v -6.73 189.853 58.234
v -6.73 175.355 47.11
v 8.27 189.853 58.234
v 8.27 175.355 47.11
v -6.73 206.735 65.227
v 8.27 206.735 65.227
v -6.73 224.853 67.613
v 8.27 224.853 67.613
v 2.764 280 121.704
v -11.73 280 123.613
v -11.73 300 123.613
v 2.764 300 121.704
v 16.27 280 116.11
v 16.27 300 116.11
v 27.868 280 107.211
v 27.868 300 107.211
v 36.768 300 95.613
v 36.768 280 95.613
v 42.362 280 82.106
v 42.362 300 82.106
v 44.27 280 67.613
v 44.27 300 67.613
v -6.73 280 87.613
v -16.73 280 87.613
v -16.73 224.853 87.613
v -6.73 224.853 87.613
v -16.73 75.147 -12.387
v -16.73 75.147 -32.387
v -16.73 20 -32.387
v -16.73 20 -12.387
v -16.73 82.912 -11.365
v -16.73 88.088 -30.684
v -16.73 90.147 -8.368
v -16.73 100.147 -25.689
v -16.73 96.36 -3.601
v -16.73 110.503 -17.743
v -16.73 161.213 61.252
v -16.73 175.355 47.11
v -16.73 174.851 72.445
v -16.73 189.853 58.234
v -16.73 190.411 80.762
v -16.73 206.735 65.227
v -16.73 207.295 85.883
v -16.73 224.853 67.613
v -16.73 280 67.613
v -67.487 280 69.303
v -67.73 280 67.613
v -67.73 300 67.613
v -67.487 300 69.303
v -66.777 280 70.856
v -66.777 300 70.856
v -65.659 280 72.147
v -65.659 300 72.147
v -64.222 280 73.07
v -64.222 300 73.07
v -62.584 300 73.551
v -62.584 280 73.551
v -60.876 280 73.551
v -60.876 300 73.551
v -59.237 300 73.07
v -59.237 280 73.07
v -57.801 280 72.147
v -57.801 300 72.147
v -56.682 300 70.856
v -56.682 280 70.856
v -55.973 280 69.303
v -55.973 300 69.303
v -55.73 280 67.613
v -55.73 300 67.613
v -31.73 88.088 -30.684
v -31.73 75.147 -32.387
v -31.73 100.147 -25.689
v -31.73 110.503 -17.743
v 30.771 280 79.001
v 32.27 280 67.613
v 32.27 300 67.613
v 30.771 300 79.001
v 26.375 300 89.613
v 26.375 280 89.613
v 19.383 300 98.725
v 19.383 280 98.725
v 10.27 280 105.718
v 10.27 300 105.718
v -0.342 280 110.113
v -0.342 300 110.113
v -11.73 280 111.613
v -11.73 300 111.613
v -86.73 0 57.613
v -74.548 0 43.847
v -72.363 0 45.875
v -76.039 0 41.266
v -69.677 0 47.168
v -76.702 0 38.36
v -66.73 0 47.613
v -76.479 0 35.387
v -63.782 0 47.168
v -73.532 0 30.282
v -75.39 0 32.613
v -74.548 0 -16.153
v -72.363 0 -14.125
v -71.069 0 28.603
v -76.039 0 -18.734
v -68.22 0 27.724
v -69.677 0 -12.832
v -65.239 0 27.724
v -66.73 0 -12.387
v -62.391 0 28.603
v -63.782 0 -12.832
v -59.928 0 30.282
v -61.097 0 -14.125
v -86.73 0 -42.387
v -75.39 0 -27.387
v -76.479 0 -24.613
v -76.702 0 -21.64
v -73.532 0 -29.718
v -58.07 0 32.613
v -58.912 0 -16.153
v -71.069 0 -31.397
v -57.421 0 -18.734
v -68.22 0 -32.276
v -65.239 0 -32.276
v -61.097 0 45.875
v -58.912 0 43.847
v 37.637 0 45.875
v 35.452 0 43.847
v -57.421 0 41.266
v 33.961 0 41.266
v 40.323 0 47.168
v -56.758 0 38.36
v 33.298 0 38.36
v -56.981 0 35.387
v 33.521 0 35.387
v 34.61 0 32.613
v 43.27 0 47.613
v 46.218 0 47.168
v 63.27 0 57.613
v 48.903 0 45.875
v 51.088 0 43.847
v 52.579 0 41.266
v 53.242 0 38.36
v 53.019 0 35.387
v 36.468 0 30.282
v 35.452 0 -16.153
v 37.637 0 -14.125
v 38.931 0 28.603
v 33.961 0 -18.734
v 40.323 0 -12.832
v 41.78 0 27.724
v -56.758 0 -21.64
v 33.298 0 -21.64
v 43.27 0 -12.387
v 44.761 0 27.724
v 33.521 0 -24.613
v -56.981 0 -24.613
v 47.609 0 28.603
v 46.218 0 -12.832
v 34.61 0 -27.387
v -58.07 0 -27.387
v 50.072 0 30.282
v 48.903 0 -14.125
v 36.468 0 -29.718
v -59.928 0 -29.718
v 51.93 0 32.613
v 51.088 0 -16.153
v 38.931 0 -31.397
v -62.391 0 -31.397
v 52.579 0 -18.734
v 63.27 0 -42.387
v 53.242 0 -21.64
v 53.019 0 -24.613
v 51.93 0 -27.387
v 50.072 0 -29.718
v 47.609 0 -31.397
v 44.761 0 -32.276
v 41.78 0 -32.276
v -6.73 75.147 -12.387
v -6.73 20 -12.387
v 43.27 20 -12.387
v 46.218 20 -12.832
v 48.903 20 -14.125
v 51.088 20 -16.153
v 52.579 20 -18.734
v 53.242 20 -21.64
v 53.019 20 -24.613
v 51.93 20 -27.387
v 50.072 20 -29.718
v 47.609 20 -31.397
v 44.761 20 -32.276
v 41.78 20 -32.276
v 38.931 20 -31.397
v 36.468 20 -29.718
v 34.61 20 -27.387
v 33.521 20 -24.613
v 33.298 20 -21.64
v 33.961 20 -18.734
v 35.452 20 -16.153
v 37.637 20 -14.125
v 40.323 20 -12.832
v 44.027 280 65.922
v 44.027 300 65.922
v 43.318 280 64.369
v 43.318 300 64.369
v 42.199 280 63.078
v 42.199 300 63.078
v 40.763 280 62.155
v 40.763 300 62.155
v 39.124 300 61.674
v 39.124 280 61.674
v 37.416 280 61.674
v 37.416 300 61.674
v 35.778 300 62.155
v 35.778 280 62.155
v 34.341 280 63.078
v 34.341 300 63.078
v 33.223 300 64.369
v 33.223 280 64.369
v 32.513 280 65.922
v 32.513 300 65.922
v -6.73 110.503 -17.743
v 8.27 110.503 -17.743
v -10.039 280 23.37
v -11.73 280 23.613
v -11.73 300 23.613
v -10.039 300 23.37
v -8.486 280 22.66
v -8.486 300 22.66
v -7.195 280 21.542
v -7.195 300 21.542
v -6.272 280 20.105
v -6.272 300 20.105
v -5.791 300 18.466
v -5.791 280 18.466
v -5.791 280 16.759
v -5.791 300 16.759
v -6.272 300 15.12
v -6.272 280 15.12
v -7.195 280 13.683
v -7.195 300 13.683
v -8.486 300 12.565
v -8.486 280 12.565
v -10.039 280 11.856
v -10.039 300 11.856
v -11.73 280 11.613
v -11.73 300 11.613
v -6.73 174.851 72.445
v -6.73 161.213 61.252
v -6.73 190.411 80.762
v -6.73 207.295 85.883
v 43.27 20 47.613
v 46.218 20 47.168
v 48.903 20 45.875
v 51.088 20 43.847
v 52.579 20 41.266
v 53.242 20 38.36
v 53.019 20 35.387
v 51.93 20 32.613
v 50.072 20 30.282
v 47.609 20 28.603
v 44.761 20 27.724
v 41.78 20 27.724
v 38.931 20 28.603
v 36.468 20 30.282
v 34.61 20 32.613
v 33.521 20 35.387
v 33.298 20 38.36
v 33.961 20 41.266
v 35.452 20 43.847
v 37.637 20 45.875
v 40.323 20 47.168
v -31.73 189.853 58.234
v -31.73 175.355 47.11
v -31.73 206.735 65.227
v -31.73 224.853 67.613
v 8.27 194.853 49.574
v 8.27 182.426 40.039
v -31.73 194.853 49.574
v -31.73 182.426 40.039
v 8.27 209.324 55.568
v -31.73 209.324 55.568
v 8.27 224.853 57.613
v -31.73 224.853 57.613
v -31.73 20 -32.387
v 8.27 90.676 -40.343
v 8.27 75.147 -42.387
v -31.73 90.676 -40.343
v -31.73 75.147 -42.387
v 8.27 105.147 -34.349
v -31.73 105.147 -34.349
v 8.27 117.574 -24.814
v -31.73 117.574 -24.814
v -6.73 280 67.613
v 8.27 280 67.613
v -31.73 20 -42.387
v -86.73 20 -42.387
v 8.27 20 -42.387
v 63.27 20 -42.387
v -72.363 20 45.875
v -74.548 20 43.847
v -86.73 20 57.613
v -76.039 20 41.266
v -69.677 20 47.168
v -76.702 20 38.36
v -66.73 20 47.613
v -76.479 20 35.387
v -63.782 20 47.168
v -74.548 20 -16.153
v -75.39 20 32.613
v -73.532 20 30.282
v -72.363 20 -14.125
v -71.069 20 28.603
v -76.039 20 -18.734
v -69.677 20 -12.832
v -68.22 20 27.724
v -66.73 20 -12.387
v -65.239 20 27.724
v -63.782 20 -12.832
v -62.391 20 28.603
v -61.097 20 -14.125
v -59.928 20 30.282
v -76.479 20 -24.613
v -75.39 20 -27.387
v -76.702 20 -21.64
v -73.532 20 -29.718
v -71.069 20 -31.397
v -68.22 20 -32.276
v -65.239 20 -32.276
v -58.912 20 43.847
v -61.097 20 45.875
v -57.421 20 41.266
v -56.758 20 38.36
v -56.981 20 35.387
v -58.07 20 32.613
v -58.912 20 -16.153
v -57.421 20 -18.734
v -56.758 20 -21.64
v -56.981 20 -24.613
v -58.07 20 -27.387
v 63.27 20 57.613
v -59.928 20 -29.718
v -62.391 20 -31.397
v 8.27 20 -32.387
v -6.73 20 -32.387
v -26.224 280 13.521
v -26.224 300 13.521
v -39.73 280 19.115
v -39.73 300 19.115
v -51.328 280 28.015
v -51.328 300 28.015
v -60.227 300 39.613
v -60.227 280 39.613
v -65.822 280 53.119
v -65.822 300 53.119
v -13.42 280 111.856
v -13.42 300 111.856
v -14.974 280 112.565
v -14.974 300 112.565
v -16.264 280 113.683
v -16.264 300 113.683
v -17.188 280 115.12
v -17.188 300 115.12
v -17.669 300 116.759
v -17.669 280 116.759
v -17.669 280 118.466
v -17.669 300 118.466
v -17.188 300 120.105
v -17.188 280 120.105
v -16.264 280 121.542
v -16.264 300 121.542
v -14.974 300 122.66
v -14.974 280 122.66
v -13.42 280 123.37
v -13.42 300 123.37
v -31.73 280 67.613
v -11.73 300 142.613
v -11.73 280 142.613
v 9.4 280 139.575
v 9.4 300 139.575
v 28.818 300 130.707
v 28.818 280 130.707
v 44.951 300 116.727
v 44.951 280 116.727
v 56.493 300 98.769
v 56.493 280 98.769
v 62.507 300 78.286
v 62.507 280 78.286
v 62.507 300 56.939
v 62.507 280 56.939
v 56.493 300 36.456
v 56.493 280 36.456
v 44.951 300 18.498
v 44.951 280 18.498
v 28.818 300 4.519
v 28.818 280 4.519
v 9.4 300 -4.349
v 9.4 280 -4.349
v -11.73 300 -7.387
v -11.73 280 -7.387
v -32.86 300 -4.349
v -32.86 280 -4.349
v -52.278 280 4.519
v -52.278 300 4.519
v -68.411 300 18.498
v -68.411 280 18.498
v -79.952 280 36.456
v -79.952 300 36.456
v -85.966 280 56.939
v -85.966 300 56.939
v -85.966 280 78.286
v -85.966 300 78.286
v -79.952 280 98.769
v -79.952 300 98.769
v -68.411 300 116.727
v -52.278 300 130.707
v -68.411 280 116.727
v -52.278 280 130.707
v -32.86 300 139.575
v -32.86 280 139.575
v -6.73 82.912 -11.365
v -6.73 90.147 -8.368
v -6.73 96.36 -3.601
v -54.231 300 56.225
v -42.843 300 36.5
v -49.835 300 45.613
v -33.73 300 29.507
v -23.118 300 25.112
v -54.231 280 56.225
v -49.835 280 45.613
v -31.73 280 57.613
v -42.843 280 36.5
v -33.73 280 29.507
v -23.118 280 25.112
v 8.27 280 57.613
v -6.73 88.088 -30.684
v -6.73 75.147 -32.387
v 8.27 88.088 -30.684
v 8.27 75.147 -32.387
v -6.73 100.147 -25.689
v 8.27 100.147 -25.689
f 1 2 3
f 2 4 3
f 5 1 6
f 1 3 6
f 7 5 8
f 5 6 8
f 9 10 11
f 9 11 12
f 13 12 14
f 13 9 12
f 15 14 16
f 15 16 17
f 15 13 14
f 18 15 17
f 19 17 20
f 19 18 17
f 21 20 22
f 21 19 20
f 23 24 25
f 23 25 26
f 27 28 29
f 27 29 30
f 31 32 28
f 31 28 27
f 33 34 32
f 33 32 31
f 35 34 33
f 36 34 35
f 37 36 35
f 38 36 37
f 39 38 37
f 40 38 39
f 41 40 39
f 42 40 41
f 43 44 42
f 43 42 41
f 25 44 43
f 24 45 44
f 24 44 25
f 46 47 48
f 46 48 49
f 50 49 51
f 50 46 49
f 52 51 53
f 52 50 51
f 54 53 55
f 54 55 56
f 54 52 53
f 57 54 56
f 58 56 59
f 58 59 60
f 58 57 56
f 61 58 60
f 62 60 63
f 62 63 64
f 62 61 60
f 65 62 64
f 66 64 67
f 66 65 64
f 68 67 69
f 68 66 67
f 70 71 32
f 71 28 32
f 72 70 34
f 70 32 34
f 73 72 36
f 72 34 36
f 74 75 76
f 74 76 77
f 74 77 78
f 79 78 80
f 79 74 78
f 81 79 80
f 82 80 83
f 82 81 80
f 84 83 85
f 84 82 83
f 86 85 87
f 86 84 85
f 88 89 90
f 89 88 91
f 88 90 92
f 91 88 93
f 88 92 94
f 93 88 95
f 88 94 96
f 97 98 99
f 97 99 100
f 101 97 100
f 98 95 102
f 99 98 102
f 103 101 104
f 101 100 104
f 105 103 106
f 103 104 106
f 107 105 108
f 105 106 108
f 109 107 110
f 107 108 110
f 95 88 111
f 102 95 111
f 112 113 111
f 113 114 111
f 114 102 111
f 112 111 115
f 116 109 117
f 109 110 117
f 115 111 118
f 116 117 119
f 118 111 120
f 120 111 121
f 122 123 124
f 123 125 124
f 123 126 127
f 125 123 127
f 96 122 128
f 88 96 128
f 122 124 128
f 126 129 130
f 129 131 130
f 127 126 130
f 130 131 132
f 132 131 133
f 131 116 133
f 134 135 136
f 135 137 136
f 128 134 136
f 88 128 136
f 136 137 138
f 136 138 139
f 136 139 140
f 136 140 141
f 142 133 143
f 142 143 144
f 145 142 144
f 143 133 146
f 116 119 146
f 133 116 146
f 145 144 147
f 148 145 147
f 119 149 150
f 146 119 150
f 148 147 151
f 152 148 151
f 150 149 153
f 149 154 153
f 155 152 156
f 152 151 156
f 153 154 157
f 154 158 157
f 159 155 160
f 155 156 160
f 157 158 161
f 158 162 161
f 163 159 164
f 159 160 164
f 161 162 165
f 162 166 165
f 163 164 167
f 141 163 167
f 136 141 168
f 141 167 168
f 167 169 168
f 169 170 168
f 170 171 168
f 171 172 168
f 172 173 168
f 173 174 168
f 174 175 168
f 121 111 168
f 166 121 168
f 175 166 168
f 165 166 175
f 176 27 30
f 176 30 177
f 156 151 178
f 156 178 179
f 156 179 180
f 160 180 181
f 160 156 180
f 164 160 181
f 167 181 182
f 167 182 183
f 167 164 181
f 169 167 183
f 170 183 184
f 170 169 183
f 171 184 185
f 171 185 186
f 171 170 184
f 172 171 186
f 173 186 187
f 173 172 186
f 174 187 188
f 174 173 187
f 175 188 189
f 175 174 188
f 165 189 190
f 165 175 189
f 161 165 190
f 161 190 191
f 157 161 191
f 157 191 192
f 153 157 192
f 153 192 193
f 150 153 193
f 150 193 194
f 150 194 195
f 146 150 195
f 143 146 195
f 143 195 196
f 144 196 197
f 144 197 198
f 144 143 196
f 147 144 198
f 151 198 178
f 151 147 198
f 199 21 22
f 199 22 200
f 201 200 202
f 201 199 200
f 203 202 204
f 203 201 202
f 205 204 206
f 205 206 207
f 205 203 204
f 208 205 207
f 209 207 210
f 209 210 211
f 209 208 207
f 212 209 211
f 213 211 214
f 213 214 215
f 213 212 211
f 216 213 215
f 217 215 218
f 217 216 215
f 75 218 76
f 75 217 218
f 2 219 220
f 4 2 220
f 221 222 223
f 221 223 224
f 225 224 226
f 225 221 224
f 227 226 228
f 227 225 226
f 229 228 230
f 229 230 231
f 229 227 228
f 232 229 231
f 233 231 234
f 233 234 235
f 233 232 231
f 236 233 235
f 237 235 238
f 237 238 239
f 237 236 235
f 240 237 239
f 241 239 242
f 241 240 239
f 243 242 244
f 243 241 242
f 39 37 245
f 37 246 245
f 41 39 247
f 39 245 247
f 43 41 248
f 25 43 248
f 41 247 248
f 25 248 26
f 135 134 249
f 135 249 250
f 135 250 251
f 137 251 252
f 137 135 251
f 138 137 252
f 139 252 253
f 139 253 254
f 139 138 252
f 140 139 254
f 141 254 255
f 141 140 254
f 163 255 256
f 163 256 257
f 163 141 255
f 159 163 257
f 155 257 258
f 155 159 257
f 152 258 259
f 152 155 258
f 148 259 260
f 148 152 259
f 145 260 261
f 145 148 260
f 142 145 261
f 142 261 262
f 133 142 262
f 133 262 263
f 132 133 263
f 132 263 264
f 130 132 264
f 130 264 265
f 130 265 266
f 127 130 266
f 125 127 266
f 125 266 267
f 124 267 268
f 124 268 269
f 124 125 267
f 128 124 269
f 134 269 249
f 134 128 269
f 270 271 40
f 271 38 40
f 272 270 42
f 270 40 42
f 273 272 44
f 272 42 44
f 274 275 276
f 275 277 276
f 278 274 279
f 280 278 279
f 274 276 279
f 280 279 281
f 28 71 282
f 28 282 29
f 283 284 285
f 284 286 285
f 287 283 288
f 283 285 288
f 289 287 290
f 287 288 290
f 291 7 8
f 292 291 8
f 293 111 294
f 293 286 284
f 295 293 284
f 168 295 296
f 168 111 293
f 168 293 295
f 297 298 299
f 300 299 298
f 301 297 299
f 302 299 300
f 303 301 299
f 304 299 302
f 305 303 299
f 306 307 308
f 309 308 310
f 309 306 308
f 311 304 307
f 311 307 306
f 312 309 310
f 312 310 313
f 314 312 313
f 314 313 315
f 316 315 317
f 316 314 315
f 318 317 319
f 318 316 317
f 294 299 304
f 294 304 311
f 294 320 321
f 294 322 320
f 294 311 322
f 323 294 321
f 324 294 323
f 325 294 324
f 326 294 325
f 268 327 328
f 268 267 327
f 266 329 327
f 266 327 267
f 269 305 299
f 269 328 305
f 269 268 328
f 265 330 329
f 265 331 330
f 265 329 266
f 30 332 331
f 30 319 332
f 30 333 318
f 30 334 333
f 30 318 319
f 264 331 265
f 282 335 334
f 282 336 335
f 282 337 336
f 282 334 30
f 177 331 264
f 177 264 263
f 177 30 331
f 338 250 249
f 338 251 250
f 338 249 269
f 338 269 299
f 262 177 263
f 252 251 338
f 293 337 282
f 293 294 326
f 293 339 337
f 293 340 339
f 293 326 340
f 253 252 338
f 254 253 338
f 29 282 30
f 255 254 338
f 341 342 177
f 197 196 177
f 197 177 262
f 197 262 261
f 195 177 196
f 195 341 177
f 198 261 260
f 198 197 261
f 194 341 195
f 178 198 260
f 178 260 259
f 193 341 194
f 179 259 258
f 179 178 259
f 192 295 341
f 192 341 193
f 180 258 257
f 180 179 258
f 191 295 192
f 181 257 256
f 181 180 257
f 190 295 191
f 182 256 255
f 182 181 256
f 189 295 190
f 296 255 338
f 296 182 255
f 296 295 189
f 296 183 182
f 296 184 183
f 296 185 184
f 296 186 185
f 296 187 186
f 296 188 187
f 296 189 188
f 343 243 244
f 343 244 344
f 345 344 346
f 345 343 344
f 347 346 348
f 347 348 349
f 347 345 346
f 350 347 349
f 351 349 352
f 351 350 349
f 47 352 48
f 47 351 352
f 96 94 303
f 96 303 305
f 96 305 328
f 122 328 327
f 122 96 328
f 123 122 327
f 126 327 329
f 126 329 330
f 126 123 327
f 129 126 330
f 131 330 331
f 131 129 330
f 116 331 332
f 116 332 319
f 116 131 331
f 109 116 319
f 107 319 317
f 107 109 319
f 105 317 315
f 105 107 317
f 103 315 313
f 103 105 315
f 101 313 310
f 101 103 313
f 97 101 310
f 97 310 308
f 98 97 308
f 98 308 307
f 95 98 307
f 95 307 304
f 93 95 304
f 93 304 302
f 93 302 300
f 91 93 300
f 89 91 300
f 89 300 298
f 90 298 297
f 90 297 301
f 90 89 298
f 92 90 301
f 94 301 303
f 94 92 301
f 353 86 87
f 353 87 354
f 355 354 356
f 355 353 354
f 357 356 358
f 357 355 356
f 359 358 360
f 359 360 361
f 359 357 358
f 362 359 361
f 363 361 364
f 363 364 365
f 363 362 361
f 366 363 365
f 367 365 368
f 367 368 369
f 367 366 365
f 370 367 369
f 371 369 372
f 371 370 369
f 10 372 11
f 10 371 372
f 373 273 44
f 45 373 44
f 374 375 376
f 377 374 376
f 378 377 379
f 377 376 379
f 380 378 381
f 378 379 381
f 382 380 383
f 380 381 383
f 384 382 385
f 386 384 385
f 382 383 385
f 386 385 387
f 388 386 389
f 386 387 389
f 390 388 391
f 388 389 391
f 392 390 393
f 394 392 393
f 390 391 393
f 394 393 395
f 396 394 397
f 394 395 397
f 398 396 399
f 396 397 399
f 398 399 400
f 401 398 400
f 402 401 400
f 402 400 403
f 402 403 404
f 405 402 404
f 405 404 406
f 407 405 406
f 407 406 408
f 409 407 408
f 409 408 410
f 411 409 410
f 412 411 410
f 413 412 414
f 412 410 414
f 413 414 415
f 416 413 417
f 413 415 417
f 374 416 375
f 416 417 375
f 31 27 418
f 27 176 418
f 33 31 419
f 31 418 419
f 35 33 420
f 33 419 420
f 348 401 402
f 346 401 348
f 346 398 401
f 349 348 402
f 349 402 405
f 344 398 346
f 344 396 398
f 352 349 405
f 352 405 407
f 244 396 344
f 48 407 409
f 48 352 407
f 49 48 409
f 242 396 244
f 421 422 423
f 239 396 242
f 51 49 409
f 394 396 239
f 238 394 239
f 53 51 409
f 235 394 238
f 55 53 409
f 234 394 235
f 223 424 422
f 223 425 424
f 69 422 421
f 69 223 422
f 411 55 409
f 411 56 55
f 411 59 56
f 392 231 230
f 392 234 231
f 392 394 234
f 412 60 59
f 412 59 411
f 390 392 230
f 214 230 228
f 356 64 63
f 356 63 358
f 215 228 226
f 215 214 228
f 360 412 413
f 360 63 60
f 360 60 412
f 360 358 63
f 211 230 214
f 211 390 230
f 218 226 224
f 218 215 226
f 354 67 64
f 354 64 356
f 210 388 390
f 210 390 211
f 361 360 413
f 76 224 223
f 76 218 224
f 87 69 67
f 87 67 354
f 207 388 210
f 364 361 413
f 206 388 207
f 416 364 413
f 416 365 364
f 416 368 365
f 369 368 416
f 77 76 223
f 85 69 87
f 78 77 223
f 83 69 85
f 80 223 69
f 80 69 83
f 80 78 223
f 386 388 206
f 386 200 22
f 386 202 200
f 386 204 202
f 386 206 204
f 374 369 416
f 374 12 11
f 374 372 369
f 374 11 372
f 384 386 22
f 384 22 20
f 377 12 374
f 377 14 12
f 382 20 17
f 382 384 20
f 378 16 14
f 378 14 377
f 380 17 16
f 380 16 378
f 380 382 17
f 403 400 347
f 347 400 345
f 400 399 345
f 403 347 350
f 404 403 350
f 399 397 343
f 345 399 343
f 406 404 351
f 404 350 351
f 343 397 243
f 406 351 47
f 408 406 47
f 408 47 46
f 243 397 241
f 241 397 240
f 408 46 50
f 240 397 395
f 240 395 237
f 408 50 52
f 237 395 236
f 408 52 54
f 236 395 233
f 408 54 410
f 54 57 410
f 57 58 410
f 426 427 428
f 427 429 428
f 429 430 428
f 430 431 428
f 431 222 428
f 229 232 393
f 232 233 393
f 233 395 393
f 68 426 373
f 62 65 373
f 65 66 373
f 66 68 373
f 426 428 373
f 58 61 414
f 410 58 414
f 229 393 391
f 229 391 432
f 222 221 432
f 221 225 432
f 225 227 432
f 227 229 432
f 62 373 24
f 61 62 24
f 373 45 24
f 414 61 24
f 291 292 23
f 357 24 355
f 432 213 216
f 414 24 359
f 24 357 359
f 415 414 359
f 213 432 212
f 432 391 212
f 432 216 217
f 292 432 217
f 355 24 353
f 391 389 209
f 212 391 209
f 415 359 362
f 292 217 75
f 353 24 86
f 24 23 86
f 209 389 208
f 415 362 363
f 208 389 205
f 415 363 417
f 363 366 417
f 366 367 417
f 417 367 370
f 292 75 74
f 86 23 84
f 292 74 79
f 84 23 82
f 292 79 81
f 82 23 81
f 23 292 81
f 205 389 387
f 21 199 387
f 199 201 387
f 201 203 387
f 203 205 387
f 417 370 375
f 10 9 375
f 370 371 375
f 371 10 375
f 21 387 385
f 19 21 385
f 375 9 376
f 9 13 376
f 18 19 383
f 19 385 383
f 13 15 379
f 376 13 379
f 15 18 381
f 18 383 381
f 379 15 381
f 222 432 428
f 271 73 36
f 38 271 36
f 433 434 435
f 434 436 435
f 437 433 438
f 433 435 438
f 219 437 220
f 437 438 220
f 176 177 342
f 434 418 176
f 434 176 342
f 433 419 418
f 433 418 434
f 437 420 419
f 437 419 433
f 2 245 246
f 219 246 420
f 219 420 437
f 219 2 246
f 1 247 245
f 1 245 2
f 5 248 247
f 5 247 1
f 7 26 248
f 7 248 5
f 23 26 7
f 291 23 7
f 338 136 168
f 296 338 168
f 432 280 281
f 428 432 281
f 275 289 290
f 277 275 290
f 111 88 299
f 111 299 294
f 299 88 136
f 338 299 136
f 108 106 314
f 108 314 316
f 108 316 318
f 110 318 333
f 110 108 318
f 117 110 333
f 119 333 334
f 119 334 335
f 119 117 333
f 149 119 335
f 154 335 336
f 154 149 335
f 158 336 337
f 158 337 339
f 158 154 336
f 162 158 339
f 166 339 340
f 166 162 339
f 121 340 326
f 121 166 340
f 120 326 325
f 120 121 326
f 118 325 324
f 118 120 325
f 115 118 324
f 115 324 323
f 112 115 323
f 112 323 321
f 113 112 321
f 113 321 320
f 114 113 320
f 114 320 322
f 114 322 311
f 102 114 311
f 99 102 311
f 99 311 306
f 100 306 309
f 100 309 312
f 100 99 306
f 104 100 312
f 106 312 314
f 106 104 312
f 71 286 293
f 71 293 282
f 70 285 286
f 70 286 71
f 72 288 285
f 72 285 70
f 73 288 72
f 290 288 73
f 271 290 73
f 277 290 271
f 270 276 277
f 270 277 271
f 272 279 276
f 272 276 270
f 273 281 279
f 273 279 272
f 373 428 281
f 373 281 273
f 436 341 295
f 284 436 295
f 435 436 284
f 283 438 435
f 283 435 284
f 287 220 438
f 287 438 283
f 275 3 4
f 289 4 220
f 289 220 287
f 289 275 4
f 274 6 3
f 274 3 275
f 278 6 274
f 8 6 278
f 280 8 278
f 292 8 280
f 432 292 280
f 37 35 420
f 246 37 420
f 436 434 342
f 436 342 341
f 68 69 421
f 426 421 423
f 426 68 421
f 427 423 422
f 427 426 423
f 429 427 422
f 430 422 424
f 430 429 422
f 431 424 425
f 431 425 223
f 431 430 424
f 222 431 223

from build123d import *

# Parameters (mm, degrees)
SKETCH1_W           = 150
SKETCH1_H           = 100
SKETCH1_R           = 10
BOSS_EXTRUDE1_DEPTH = 20
SKETCH6_R           = 75
BOSS_EXTRUDE2_DEPTH = 20


with BuildPart() as part:
    # Sketch1 → Boss-Extrude1 (new body)
    with BuildSketch(Plane(origin=(0, 0, 0), x_dir=(1, 0, 0), z_dir=(0, 1, 0))):
        with Locations((-11.72985782, -7.612559242)):
            Rectangle(SKETCH1_W, SKETCH1_H)
        with Locations(Location((43.27014218, -37.612559242, 0), (0, 0, 270))):
            Circle(SKETCH1_R, mode=Mode.SUBTRACT)
        with Locations(Location((43.27014218, 22.387440758, 0), (0, 0, 270))):
            Circle(SKETCH1_R, mode=Mode.SUBTRACT)
        with Locations(Location((-66.72985782, 22.387440758, 0), (0, 0, 270))):
            Circle(SKETCH1_R, mode=Mode.SUBTRACT)
        with Locations(Location((-66.72985782, -37.612559242, 0), (0, 0, 270))):
            Circle(SKETCH1_R, mode=Mode.SUBTRACT)
    extrude(amount=BOSS_EXTRUDE1_DEPTH)

    # Sweep1: sweep along a path in Sketch4
    with BuildLine(Plane.ZY.offset(11.72985782)) as sweep1_path:
        Line((-42.387440758, 20), (-42.387440758, 75.147186258))
        ThreePointArc((-42.387440758, 75.147186258), (-37.820212709, 98.1081922), (-24.813847629, 117.573593129))
        Line((-24.813847629, 117.573593129), (40.038966113, 182.426406871))
        ThreePointArc((40.038966113, 182.426406871), (53.045331192, 201.8918078), (57.612559242, 224.852813742))
        Line((57.612559242, 224.852813742), (57.612559242, 280))
    # Sketch5 → Sweep1 (sweep)
    with BuildSketch(Plane(origin=(0, 20, 0), x_dir=(1, 0, 0), z_dir=(0, 1, 0))):
        Polygon((-31.72985782, 42.387440758), (8.27014218, 42.387440758), (8.27014218, 32.387440758), (-6.72985782, 32.387440758), (-6.72985782, 12.387440758), (-16.72985782, 12.387440758), (-16.72985782, 32.387440758), (-31.72985782, 32.387440758), align=None)
    sweep(path=sweep1_path.line)

    # Sketch6 → Boss-Extrude2 (add)
    with BuildSketch(Plane(origin=(0, 280, 0), x_dir=(1, 0, 0), z_dir=(0, 1, 0))):
        with Locations(Location((-11.72985782, -67.612559242, 0), (0, 0, 270))):
            Circle(SKETCH6_R)
        with BuildLine():
            ThreePointArc((-11.72985782, -11.612559242), (-51.327837566, -28.014579495), (-67.72985782, -67.612559242))
            ThreePointArc((-67.72985782, -67.612559242), (-61.72985782, -73.612559242), (-55.72985782, -67.612559242))
            ThreePointArc((-55.72985782, -67.612559242), (-42.842556192, -36.499860869), (-11.72985782, -23.612559242))
            ThreePointArc((-11.72985782, -23.612559242), (-5.72985782, -17.612559242), (-11.72985782, -11.612559242))
        make_face(mode=Mode.SUBTRACT)
        with BuildLine():
            ThreePointArc((-11.72985782, -123.612559242), (27.868121927, -107.210538988), (44.27014218, -67.612559242))
            ThreePointArc((44.27014218, -67.612559242), (38.27014218, -61.612559242), (32.27014218, -67.612559242))
            ThreePointArc((32.27014218, -67.612559242), (19.382840552, -98.725257614), (-11.72985782, -111.612559242))
            ThreePointArc((-11.72985782, -111.612559242), (-17.72985782, -117.612559242), (-11.72985782, -123.612559242))
        make_face(mode=Mode.SUBTRACT)
    extrude(amount=BOSS_EXTRUDE2_DEPTH)


solid = part.part
